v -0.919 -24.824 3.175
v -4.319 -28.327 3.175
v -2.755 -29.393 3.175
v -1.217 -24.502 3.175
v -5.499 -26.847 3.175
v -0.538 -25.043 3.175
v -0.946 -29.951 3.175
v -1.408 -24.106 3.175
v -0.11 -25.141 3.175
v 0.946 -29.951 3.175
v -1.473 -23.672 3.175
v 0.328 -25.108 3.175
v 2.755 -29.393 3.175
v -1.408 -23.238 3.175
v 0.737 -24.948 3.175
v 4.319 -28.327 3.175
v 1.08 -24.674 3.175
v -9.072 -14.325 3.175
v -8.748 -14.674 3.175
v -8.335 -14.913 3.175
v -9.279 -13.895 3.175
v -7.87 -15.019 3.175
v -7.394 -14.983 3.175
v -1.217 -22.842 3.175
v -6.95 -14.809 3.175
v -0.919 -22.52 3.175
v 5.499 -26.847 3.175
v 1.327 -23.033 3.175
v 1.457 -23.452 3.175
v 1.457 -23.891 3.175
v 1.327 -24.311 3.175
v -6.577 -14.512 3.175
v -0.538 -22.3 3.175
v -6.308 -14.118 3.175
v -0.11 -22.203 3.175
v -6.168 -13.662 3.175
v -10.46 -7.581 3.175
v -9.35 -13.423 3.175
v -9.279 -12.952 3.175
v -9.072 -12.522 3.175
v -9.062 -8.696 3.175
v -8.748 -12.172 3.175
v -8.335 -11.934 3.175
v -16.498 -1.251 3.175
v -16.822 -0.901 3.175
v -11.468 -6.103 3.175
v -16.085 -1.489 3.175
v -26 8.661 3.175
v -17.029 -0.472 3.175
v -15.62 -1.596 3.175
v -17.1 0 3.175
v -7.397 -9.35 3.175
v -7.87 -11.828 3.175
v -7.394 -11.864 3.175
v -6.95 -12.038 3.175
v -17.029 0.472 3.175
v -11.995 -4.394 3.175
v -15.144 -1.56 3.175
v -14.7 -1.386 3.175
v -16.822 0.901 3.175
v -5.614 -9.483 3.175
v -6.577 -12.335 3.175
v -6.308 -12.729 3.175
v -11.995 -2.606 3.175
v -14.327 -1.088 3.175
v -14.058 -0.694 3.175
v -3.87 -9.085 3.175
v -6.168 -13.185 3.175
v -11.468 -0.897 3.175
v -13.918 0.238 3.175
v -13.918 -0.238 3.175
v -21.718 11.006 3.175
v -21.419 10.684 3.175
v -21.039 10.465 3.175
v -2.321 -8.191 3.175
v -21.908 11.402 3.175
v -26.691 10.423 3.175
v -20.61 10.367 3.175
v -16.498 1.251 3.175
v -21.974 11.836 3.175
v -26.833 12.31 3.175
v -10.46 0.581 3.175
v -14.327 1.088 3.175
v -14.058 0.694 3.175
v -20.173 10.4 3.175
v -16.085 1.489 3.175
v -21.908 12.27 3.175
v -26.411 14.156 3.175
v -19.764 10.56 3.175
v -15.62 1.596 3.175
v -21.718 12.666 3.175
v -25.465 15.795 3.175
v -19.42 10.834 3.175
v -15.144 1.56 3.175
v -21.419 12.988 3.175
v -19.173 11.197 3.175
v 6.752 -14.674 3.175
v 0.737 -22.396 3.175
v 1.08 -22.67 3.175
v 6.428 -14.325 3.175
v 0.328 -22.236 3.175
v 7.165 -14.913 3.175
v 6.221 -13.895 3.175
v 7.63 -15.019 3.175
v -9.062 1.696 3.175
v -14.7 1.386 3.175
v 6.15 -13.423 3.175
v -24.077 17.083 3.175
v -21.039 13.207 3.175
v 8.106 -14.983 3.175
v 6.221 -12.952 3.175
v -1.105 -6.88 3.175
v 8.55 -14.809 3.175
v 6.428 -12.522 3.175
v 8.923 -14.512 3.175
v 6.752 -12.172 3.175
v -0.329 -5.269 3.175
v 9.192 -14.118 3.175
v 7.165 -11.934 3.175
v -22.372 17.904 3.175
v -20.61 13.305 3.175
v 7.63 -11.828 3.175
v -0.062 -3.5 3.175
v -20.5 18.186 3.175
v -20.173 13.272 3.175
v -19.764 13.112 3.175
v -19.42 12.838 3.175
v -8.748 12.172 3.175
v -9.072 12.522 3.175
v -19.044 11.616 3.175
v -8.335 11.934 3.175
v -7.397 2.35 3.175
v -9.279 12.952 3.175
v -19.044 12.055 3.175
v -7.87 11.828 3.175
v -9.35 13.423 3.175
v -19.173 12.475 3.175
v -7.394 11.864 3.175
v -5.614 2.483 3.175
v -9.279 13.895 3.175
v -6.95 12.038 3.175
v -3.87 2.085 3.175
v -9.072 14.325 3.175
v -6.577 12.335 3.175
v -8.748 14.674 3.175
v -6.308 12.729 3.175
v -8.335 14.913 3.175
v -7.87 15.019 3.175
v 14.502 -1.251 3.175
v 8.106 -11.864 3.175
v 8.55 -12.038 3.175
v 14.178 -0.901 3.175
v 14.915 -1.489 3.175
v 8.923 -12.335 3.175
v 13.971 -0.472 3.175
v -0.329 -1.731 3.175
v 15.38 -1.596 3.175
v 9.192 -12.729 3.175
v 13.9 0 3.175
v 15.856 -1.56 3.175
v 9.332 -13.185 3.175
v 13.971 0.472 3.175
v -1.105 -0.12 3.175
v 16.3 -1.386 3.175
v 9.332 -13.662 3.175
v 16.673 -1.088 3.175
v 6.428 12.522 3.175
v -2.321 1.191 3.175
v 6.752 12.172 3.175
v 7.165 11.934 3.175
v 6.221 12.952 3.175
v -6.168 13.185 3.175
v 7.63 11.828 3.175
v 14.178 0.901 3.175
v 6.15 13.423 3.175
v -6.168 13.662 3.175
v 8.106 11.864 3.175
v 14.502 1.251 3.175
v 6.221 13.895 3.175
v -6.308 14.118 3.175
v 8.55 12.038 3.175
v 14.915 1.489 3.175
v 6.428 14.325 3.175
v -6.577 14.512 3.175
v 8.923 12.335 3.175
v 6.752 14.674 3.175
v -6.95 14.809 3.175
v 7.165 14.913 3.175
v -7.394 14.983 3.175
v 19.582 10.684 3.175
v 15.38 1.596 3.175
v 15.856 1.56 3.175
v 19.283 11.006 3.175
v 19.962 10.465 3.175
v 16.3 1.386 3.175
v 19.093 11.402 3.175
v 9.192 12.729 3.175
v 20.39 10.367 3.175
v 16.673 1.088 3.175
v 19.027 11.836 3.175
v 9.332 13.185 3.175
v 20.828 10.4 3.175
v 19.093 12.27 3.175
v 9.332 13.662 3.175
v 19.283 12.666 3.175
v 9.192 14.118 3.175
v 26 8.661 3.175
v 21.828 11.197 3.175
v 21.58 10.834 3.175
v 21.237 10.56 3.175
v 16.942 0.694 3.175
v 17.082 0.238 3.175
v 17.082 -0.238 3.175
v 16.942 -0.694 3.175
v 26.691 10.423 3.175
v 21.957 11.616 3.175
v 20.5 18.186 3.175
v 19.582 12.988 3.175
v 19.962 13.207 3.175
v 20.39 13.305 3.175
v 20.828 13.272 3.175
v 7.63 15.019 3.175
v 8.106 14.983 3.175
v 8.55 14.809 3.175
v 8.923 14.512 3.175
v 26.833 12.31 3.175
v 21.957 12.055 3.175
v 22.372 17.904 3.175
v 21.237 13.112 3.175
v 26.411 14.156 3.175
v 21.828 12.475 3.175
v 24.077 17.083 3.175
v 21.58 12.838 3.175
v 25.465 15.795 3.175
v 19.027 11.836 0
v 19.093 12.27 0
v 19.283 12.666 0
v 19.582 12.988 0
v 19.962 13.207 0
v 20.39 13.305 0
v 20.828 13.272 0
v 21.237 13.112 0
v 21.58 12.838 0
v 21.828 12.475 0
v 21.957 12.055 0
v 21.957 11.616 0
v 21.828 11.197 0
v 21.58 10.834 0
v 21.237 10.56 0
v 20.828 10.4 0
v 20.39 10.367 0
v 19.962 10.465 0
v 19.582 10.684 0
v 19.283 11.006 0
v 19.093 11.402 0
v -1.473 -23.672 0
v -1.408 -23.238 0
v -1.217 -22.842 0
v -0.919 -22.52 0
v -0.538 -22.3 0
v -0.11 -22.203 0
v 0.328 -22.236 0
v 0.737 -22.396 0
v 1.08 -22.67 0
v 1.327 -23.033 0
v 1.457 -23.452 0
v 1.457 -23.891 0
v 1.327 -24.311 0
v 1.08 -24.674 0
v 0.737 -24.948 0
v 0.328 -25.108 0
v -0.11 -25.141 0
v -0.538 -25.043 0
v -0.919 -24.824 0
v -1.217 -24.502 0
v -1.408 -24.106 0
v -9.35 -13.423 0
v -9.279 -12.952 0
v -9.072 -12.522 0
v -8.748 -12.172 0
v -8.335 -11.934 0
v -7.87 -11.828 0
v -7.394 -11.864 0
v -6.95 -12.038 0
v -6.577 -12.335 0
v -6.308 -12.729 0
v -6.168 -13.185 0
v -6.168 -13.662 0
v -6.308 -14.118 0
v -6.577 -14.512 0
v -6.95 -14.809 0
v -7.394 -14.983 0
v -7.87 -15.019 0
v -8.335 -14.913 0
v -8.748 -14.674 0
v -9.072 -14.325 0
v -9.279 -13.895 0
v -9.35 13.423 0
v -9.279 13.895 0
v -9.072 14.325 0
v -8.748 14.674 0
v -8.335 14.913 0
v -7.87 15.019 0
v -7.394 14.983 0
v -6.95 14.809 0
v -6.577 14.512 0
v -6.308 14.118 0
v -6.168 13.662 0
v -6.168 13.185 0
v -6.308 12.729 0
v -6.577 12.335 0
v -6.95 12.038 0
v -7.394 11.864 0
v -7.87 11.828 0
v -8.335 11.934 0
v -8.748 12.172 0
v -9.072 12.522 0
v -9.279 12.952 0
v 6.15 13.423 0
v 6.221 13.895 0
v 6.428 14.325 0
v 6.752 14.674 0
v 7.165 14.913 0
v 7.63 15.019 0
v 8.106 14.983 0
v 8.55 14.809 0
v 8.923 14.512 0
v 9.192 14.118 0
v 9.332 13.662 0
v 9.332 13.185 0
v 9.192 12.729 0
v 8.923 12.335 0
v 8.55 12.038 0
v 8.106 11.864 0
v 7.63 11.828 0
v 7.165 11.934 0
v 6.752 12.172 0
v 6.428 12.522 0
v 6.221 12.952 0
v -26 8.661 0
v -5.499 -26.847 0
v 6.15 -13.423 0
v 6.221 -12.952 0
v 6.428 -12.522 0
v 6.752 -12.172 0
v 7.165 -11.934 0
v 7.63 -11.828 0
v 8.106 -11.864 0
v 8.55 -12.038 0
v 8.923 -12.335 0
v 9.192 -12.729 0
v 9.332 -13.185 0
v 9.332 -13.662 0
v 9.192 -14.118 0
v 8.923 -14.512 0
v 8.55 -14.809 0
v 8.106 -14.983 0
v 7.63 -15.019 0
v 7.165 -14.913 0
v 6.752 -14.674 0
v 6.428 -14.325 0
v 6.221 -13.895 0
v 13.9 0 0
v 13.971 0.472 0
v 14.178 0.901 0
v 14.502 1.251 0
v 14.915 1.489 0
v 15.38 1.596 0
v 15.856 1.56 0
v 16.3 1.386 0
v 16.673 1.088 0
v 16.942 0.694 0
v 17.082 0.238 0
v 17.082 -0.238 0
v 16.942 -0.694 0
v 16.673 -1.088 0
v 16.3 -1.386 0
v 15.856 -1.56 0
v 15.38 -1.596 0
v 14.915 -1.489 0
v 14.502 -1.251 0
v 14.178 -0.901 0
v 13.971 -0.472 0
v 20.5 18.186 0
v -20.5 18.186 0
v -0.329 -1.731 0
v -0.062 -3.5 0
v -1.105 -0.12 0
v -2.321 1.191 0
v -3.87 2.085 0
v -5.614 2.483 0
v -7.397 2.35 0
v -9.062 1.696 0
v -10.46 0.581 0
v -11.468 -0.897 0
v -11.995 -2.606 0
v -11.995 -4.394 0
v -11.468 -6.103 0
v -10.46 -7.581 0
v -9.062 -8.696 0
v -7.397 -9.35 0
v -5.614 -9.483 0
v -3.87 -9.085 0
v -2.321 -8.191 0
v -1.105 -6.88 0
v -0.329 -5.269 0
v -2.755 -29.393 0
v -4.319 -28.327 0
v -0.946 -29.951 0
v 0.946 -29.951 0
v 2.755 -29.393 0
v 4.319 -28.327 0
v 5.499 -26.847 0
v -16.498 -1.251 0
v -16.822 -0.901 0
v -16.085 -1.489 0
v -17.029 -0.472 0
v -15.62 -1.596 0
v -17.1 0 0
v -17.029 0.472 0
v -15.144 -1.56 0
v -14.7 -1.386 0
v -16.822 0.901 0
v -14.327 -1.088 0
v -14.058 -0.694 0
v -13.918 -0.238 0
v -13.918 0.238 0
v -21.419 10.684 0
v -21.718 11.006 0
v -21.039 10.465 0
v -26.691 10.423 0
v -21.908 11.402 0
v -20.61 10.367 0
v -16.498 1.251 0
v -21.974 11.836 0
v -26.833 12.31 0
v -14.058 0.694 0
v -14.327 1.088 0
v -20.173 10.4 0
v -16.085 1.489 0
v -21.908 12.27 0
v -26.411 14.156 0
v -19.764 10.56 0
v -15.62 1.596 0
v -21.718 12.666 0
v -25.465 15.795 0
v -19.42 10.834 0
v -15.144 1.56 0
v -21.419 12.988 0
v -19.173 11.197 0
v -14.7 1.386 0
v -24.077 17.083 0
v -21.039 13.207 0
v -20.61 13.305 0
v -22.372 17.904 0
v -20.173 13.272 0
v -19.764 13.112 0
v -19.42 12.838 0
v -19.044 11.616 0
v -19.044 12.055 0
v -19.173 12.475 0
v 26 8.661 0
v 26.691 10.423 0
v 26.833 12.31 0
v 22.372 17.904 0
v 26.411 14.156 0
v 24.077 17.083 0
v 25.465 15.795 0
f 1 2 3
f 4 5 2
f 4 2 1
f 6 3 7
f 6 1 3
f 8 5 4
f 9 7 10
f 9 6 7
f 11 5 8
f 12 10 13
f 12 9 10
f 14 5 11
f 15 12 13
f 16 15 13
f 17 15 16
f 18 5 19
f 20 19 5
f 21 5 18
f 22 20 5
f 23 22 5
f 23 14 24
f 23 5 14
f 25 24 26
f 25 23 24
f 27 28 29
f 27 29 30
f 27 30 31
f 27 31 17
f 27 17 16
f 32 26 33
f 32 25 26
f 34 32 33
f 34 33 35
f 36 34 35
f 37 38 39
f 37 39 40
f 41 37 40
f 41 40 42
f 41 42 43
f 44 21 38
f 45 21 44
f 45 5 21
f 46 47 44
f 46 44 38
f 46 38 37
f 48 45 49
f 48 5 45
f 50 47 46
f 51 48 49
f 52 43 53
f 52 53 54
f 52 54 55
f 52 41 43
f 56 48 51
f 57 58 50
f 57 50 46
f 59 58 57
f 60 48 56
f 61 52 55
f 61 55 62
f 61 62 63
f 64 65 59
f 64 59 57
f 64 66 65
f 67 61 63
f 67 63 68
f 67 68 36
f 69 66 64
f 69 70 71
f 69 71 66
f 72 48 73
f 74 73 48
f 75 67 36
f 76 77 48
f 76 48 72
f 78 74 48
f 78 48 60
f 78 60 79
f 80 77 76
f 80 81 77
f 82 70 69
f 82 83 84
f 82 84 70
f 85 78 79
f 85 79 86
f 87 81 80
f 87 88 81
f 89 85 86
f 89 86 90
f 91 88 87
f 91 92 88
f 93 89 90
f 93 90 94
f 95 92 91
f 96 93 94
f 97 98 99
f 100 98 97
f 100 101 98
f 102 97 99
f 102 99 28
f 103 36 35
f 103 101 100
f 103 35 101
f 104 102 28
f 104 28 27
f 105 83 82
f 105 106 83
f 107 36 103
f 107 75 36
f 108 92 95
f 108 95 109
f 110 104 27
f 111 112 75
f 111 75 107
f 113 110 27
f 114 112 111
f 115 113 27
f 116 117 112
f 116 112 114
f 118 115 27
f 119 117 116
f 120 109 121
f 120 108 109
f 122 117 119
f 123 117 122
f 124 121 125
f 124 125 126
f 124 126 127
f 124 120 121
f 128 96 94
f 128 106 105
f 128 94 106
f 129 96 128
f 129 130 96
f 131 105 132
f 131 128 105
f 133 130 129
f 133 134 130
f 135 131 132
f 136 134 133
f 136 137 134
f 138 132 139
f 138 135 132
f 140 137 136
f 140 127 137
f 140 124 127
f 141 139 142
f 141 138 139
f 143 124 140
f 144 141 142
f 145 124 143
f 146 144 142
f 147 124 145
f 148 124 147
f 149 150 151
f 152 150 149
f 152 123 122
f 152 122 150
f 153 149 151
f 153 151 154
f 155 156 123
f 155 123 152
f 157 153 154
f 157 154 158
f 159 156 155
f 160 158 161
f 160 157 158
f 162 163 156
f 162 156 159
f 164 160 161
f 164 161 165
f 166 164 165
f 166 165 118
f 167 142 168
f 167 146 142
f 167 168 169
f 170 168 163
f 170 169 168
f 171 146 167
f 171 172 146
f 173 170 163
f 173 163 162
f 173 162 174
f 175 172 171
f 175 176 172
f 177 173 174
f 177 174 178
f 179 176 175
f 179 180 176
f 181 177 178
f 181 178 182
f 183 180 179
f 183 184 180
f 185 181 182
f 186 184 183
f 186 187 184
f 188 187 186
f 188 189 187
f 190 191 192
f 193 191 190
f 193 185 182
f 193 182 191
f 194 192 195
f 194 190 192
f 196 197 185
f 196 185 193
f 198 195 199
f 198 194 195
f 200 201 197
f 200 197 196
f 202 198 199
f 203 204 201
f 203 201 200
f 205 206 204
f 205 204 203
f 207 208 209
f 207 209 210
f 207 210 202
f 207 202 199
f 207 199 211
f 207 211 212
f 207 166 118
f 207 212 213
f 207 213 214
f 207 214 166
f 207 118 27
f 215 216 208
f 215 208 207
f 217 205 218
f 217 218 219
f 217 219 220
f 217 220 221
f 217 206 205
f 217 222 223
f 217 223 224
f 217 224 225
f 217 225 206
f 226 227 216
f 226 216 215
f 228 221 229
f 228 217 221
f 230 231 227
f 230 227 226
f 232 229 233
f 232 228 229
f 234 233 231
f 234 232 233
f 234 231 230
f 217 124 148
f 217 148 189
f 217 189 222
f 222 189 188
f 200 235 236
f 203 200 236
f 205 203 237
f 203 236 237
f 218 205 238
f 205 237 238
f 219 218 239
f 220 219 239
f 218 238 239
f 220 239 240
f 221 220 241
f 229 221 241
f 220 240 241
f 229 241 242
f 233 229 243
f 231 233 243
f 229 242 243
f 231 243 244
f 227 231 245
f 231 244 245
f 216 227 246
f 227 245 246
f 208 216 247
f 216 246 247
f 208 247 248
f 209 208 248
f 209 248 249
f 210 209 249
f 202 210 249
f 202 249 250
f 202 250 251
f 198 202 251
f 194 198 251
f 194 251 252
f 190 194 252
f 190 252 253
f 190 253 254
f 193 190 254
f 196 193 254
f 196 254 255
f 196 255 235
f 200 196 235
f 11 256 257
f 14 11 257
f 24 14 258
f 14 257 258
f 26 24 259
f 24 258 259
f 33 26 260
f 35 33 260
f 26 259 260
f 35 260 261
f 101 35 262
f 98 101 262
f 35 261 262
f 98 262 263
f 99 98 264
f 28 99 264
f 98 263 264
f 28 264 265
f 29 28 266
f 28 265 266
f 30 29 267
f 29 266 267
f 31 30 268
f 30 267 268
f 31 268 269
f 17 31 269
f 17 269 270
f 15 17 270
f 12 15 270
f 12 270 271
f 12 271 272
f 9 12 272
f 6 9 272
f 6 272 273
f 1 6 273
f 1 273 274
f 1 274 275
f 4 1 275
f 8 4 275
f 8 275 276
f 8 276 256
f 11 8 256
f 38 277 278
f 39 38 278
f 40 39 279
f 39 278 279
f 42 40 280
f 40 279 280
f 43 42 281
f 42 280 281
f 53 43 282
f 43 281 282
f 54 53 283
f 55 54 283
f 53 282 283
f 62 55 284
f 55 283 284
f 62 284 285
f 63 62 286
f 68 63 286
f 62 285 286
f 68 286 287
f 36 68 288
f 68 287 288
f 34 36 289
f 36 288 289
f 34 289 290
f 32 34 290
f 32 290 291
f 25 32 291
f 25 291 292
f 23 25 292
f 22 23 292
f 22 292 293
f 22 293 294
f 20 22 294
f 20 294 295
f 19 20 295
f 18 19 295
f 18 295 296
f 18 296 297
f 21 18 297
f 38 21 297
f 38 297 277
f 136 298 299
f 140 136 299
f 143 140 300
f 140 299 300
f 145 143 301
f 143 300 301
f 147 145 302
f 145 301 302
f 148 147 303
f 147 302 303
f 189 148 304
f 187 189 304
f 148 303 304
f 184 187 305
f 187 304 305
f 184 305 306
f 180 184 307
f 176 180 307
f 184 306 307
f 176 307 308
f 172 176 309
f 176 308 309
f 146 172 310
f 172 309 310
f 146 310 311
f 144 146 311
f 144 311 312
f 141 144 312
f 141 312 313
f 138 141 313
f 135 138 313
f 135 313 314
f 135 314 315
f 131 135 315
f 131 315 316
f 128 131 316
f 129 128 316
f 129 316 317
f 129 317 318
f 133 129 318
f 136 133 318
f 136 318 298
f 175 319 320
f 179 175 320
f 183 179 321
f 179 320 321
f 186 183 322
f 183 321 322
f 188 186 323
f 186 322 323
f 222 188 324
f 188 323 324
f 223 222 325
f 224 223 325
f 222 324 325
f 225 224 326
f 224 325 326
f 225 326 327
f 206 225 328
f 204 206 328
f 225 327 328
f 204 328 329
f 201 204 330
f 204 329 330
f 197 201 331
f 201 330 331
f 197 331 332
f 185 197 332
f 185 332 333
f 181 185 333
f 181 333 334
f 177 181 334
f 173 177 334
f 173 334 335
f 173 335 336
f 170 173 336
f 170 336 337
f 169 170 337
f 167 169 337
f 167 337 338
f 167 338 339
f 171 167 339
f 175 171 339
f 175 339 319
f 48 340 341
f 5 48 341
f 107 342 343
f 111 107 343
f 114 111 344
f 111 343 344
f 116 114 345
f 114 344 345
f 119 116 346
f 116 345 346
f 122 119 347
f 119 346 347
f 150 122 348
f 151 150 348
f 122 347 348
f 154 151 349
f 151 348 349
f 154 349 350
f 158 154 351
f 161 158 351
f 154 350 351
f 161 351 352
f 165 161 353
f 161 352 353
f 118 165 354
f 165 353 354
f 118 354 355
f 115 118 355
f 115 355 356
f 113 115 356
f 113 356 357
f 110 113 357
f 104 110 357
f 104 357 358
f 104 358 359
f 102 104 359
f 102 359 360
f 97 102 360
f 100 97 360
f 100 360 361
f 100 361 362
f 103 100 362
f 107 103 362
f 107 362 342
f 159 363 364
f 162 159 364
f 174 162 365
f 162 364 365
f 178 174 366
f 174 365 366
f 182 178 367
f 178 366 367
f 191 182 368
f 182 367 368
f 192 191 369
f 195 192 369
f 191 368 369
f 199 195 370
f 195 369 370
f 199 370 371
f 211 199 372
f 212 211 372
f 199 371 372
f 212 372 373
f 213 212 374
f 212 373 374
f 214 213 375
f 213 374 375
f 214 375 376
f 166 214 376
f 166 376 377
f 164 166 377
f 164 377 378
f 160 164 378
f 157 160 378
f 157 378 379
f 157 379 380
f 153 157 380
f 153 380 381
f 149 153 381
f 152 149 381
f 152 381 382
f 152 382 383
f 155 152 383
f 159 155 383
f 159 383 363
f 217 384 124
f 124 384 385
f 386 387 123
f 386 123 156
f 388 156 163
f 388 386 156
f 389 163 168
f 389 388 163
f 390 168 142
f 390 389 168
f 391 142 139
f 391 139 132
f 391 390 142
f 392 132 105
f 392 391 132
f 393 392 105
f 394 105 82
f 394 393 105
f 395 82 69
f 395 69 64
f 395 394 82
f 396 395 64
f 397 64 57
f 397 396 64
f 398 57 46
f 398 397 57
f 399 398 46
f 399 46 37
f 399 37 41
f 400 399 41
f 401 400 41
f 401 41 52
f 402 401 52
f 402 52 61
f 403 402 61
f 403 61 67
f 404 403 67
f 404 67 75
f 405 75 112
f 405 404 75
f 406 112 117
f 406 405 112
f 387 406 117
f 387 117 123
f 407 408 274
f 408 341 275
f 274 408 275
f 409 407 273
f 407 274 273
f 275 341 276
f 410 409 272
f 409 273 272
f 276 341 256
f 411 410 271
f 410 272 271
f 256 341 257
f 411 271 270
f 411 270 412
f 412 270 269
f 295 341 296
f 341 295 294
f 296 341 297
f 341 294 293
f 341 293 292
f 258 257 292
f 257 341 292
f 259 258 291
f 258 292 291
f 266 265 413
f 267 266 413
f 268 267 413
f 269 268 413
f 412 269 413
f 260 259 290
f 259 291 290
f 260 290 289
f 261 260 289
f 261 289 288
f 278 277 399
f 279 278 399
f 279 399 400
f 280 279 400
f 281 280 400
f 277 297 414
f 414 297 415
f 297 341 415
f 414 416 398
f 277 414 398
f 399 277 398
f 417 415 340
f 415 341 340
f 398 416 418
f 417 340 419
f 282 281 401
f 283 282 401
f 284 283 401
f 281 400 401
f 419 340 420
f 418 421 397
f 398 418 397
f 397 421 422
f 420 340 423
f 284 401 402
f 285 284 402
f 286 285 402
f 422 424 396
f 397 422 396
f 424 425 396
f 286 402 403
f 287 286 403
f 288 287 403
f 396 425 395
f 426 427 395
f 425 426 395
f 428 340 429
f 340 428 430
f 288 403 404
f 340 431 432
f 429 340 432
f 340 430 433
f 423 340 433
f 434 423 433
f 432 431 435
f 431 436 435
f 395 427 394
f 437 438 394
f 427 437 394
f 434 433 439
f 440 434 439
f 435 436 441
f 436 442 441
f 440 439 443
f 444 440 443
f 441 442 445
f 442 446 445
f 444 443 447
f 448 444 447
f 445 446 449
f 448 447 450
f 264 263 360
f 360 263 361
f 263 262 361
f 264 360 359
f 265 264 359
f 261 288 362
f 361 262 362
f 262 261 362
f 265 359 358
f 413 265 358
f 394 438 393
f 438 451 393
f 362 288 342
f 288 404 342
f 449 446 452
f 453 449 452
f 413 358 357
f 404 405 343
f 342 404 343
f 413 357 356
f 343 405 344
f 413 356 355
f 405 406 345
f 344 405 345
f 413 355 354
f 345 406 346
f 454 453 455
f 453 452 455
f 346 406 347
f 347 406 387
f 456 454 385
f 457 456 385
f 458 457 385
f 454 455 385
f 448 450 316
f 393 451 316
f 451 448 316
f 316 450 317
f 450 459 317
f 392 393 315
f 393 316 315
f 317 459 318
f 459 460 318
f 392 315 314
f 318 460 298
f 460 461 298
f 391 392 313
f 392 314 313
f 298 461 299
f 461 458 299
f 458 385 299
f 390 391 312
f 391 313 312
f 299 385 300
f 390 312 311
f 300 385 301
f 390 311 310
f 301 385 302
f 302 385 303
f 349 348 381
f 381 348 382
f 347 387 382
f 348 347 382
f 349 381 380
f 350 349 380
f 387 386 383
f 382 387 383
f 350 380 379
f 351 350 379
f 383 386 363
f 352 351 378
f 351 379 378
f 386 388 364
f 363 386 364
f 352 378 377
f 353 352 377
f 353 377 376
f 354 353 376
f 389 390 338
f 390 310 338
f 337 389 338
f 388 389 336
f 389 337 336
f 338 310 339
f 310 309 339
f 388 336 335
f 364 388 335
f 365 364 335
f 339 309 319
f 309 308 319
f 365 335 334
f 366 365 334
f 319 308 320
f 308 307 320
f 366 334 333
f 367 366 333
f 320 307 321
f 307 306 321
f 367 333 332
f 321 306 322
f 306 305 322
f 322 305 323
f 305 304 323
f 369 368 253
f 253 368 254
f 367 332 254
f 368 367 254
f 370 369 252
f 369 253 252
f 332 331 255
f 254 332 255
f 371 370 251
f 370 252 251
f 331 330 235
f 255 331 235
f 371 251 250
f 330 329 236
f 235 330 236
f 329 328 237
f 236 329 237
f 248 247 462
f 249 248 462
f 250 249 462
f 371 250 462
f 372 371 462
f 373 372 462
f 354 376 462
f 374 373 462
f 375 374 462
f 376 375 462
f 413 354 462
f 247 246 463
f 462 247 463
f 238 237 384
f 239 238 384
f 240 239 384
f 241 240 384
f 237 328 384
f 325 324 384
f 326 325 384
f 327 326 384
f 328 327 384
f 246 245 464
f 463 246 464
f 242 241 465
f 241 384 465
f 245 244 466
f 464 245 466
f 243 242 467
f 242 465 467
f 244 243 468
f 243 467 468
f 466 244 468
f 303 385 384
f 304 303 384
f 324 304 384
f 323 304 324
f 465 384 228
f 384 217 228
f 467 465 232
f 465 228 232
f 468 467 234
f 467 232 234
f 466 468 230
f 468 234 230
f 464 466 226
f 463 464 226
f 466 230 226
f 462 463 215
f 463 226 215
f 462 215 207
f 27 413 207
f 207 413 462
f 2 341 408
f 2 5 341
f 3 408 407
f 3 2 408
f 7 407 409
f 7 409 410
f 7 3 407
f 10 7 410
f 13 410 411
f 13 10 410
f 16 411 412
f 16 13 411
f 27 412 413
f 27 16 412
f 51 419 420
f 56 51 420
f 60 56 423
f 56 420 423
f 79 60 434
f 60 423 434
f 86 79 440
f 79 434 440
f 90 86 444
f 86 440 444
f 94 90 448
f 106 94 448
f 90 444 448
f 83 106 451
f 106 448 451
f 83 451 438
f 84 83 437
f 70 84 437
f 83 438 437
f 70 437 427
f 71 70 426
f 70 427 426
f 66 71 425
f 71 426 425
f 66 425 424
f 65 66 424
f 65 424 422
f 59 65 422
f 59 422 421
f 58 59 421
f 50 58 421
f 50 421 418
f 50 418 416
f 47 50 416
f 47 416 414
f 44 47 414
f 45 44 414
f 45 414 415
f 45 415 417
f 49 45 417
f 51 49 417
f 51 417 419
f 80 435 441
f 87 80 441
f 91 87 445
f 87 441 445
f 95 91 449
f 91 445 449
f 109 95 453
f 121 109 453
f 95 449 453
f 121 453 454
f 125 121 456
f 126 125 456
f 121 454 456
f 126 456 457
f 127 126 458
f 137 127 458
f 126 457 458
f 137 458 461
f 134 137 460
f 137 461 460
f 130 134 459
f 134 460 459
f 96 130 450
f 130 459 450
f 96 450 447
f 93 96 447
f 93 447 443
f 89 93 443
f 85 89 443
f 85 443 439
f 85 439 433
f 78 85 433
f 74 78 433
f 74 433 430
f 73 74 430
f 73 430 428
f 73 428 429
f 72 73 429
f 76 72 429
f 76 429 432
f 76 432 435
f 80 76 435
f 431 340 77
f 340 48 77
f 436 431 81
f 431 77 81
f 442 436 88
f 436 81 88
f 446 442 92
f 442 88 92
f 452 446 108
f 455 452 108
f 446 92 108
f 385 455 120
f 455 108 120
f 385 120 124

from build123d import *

# Parameters (mm, degrees)
SKETCH1_R                 = 6
BOSS_EXTRUDE1_DEPTH       = 3.175
M3_CLEARANCE_HOLE1_D      = 3.2
FILLET1_R                 = 6.35
F_4_CLEARANCE_HOLE1_D     = 2.9464
F_4_CLEARANCE_HOLE1_DEPTH = 3.302
F_4_CLEARANCE_HOLE1_TIP   = 0.885187864


with BuildPart() as part:
    # Sketch1 → Boss-Extrude1 (new body)
    with BuildSketch(Plane.XY):
        Polygon((-31.498891971, 18.185893759), (0, -36.371787517), (31.498891971, 18.185893759), align=None)
        with Locations((-6.062177826, -3.5)):
            Circle(SKETCH1_R, mode=Mode.SUBTRACT)
    extrude(amount=BOSS_EXTRUDE1_DEPTH)

    # M3 Clearance Hole1 (through all)
    with Locations(Plane(origin=(-27.388360069, 15.242769311, 3.175), x_dir=(1, 0, 0), z_dir=(0, 0, 1))):
        with Locations((19.638360069, -1.819375553), (35.138360069, -1.819375553), (42.888360069, -15.242769311), (11.888360069, -15.242769311), (19.638360069, -28.66616307), (35.138360069, -28.66616307)):
            Hole(M3_CLEARANCE_HOLE1_D / 2)

    # Fillet1
    fillet1_edges = [part.edges().sort_by_distance(p)[0] for p in [
        (31.498891971, 18.185893759, 1.5875),
        (0, -36.371787517, 1.5875),
        (-31.498891971, 18.185893759, 1.5875),
    ]]
    fillet(fillet1_edges, radius=FILLET1_R)

    # #4 Clearance Hole1
    with Locations(Plane(origin=(-21.085137788, 23.004512958, 3.175), x_dir=(1, 0, 0), z_dir=(0, 0, 1))):
        with Locations((0.584768445, -11.1686192), (41.585507131, -11.1686192), (21.085137788, -46.676300475)):
            Hole(F_4_CLEARANCE_HOLE1_D / 2, depth=F_4_CLEARANCE_HOLE1_DEPTH)
            with Locations((0, 0, -(F_4_CLEARANCE_HOLE1_DEPTH + F_4_CLEARANCE_HOLE1_TIP / 2))):  # 118° drill point
                Cone(0, F_4_CLEARANCE_HOLE1_D / 2, F_4_CLEARANCE_HOLE1_TIP, mode=Mode.SUBTRACT)


solid = part.part
